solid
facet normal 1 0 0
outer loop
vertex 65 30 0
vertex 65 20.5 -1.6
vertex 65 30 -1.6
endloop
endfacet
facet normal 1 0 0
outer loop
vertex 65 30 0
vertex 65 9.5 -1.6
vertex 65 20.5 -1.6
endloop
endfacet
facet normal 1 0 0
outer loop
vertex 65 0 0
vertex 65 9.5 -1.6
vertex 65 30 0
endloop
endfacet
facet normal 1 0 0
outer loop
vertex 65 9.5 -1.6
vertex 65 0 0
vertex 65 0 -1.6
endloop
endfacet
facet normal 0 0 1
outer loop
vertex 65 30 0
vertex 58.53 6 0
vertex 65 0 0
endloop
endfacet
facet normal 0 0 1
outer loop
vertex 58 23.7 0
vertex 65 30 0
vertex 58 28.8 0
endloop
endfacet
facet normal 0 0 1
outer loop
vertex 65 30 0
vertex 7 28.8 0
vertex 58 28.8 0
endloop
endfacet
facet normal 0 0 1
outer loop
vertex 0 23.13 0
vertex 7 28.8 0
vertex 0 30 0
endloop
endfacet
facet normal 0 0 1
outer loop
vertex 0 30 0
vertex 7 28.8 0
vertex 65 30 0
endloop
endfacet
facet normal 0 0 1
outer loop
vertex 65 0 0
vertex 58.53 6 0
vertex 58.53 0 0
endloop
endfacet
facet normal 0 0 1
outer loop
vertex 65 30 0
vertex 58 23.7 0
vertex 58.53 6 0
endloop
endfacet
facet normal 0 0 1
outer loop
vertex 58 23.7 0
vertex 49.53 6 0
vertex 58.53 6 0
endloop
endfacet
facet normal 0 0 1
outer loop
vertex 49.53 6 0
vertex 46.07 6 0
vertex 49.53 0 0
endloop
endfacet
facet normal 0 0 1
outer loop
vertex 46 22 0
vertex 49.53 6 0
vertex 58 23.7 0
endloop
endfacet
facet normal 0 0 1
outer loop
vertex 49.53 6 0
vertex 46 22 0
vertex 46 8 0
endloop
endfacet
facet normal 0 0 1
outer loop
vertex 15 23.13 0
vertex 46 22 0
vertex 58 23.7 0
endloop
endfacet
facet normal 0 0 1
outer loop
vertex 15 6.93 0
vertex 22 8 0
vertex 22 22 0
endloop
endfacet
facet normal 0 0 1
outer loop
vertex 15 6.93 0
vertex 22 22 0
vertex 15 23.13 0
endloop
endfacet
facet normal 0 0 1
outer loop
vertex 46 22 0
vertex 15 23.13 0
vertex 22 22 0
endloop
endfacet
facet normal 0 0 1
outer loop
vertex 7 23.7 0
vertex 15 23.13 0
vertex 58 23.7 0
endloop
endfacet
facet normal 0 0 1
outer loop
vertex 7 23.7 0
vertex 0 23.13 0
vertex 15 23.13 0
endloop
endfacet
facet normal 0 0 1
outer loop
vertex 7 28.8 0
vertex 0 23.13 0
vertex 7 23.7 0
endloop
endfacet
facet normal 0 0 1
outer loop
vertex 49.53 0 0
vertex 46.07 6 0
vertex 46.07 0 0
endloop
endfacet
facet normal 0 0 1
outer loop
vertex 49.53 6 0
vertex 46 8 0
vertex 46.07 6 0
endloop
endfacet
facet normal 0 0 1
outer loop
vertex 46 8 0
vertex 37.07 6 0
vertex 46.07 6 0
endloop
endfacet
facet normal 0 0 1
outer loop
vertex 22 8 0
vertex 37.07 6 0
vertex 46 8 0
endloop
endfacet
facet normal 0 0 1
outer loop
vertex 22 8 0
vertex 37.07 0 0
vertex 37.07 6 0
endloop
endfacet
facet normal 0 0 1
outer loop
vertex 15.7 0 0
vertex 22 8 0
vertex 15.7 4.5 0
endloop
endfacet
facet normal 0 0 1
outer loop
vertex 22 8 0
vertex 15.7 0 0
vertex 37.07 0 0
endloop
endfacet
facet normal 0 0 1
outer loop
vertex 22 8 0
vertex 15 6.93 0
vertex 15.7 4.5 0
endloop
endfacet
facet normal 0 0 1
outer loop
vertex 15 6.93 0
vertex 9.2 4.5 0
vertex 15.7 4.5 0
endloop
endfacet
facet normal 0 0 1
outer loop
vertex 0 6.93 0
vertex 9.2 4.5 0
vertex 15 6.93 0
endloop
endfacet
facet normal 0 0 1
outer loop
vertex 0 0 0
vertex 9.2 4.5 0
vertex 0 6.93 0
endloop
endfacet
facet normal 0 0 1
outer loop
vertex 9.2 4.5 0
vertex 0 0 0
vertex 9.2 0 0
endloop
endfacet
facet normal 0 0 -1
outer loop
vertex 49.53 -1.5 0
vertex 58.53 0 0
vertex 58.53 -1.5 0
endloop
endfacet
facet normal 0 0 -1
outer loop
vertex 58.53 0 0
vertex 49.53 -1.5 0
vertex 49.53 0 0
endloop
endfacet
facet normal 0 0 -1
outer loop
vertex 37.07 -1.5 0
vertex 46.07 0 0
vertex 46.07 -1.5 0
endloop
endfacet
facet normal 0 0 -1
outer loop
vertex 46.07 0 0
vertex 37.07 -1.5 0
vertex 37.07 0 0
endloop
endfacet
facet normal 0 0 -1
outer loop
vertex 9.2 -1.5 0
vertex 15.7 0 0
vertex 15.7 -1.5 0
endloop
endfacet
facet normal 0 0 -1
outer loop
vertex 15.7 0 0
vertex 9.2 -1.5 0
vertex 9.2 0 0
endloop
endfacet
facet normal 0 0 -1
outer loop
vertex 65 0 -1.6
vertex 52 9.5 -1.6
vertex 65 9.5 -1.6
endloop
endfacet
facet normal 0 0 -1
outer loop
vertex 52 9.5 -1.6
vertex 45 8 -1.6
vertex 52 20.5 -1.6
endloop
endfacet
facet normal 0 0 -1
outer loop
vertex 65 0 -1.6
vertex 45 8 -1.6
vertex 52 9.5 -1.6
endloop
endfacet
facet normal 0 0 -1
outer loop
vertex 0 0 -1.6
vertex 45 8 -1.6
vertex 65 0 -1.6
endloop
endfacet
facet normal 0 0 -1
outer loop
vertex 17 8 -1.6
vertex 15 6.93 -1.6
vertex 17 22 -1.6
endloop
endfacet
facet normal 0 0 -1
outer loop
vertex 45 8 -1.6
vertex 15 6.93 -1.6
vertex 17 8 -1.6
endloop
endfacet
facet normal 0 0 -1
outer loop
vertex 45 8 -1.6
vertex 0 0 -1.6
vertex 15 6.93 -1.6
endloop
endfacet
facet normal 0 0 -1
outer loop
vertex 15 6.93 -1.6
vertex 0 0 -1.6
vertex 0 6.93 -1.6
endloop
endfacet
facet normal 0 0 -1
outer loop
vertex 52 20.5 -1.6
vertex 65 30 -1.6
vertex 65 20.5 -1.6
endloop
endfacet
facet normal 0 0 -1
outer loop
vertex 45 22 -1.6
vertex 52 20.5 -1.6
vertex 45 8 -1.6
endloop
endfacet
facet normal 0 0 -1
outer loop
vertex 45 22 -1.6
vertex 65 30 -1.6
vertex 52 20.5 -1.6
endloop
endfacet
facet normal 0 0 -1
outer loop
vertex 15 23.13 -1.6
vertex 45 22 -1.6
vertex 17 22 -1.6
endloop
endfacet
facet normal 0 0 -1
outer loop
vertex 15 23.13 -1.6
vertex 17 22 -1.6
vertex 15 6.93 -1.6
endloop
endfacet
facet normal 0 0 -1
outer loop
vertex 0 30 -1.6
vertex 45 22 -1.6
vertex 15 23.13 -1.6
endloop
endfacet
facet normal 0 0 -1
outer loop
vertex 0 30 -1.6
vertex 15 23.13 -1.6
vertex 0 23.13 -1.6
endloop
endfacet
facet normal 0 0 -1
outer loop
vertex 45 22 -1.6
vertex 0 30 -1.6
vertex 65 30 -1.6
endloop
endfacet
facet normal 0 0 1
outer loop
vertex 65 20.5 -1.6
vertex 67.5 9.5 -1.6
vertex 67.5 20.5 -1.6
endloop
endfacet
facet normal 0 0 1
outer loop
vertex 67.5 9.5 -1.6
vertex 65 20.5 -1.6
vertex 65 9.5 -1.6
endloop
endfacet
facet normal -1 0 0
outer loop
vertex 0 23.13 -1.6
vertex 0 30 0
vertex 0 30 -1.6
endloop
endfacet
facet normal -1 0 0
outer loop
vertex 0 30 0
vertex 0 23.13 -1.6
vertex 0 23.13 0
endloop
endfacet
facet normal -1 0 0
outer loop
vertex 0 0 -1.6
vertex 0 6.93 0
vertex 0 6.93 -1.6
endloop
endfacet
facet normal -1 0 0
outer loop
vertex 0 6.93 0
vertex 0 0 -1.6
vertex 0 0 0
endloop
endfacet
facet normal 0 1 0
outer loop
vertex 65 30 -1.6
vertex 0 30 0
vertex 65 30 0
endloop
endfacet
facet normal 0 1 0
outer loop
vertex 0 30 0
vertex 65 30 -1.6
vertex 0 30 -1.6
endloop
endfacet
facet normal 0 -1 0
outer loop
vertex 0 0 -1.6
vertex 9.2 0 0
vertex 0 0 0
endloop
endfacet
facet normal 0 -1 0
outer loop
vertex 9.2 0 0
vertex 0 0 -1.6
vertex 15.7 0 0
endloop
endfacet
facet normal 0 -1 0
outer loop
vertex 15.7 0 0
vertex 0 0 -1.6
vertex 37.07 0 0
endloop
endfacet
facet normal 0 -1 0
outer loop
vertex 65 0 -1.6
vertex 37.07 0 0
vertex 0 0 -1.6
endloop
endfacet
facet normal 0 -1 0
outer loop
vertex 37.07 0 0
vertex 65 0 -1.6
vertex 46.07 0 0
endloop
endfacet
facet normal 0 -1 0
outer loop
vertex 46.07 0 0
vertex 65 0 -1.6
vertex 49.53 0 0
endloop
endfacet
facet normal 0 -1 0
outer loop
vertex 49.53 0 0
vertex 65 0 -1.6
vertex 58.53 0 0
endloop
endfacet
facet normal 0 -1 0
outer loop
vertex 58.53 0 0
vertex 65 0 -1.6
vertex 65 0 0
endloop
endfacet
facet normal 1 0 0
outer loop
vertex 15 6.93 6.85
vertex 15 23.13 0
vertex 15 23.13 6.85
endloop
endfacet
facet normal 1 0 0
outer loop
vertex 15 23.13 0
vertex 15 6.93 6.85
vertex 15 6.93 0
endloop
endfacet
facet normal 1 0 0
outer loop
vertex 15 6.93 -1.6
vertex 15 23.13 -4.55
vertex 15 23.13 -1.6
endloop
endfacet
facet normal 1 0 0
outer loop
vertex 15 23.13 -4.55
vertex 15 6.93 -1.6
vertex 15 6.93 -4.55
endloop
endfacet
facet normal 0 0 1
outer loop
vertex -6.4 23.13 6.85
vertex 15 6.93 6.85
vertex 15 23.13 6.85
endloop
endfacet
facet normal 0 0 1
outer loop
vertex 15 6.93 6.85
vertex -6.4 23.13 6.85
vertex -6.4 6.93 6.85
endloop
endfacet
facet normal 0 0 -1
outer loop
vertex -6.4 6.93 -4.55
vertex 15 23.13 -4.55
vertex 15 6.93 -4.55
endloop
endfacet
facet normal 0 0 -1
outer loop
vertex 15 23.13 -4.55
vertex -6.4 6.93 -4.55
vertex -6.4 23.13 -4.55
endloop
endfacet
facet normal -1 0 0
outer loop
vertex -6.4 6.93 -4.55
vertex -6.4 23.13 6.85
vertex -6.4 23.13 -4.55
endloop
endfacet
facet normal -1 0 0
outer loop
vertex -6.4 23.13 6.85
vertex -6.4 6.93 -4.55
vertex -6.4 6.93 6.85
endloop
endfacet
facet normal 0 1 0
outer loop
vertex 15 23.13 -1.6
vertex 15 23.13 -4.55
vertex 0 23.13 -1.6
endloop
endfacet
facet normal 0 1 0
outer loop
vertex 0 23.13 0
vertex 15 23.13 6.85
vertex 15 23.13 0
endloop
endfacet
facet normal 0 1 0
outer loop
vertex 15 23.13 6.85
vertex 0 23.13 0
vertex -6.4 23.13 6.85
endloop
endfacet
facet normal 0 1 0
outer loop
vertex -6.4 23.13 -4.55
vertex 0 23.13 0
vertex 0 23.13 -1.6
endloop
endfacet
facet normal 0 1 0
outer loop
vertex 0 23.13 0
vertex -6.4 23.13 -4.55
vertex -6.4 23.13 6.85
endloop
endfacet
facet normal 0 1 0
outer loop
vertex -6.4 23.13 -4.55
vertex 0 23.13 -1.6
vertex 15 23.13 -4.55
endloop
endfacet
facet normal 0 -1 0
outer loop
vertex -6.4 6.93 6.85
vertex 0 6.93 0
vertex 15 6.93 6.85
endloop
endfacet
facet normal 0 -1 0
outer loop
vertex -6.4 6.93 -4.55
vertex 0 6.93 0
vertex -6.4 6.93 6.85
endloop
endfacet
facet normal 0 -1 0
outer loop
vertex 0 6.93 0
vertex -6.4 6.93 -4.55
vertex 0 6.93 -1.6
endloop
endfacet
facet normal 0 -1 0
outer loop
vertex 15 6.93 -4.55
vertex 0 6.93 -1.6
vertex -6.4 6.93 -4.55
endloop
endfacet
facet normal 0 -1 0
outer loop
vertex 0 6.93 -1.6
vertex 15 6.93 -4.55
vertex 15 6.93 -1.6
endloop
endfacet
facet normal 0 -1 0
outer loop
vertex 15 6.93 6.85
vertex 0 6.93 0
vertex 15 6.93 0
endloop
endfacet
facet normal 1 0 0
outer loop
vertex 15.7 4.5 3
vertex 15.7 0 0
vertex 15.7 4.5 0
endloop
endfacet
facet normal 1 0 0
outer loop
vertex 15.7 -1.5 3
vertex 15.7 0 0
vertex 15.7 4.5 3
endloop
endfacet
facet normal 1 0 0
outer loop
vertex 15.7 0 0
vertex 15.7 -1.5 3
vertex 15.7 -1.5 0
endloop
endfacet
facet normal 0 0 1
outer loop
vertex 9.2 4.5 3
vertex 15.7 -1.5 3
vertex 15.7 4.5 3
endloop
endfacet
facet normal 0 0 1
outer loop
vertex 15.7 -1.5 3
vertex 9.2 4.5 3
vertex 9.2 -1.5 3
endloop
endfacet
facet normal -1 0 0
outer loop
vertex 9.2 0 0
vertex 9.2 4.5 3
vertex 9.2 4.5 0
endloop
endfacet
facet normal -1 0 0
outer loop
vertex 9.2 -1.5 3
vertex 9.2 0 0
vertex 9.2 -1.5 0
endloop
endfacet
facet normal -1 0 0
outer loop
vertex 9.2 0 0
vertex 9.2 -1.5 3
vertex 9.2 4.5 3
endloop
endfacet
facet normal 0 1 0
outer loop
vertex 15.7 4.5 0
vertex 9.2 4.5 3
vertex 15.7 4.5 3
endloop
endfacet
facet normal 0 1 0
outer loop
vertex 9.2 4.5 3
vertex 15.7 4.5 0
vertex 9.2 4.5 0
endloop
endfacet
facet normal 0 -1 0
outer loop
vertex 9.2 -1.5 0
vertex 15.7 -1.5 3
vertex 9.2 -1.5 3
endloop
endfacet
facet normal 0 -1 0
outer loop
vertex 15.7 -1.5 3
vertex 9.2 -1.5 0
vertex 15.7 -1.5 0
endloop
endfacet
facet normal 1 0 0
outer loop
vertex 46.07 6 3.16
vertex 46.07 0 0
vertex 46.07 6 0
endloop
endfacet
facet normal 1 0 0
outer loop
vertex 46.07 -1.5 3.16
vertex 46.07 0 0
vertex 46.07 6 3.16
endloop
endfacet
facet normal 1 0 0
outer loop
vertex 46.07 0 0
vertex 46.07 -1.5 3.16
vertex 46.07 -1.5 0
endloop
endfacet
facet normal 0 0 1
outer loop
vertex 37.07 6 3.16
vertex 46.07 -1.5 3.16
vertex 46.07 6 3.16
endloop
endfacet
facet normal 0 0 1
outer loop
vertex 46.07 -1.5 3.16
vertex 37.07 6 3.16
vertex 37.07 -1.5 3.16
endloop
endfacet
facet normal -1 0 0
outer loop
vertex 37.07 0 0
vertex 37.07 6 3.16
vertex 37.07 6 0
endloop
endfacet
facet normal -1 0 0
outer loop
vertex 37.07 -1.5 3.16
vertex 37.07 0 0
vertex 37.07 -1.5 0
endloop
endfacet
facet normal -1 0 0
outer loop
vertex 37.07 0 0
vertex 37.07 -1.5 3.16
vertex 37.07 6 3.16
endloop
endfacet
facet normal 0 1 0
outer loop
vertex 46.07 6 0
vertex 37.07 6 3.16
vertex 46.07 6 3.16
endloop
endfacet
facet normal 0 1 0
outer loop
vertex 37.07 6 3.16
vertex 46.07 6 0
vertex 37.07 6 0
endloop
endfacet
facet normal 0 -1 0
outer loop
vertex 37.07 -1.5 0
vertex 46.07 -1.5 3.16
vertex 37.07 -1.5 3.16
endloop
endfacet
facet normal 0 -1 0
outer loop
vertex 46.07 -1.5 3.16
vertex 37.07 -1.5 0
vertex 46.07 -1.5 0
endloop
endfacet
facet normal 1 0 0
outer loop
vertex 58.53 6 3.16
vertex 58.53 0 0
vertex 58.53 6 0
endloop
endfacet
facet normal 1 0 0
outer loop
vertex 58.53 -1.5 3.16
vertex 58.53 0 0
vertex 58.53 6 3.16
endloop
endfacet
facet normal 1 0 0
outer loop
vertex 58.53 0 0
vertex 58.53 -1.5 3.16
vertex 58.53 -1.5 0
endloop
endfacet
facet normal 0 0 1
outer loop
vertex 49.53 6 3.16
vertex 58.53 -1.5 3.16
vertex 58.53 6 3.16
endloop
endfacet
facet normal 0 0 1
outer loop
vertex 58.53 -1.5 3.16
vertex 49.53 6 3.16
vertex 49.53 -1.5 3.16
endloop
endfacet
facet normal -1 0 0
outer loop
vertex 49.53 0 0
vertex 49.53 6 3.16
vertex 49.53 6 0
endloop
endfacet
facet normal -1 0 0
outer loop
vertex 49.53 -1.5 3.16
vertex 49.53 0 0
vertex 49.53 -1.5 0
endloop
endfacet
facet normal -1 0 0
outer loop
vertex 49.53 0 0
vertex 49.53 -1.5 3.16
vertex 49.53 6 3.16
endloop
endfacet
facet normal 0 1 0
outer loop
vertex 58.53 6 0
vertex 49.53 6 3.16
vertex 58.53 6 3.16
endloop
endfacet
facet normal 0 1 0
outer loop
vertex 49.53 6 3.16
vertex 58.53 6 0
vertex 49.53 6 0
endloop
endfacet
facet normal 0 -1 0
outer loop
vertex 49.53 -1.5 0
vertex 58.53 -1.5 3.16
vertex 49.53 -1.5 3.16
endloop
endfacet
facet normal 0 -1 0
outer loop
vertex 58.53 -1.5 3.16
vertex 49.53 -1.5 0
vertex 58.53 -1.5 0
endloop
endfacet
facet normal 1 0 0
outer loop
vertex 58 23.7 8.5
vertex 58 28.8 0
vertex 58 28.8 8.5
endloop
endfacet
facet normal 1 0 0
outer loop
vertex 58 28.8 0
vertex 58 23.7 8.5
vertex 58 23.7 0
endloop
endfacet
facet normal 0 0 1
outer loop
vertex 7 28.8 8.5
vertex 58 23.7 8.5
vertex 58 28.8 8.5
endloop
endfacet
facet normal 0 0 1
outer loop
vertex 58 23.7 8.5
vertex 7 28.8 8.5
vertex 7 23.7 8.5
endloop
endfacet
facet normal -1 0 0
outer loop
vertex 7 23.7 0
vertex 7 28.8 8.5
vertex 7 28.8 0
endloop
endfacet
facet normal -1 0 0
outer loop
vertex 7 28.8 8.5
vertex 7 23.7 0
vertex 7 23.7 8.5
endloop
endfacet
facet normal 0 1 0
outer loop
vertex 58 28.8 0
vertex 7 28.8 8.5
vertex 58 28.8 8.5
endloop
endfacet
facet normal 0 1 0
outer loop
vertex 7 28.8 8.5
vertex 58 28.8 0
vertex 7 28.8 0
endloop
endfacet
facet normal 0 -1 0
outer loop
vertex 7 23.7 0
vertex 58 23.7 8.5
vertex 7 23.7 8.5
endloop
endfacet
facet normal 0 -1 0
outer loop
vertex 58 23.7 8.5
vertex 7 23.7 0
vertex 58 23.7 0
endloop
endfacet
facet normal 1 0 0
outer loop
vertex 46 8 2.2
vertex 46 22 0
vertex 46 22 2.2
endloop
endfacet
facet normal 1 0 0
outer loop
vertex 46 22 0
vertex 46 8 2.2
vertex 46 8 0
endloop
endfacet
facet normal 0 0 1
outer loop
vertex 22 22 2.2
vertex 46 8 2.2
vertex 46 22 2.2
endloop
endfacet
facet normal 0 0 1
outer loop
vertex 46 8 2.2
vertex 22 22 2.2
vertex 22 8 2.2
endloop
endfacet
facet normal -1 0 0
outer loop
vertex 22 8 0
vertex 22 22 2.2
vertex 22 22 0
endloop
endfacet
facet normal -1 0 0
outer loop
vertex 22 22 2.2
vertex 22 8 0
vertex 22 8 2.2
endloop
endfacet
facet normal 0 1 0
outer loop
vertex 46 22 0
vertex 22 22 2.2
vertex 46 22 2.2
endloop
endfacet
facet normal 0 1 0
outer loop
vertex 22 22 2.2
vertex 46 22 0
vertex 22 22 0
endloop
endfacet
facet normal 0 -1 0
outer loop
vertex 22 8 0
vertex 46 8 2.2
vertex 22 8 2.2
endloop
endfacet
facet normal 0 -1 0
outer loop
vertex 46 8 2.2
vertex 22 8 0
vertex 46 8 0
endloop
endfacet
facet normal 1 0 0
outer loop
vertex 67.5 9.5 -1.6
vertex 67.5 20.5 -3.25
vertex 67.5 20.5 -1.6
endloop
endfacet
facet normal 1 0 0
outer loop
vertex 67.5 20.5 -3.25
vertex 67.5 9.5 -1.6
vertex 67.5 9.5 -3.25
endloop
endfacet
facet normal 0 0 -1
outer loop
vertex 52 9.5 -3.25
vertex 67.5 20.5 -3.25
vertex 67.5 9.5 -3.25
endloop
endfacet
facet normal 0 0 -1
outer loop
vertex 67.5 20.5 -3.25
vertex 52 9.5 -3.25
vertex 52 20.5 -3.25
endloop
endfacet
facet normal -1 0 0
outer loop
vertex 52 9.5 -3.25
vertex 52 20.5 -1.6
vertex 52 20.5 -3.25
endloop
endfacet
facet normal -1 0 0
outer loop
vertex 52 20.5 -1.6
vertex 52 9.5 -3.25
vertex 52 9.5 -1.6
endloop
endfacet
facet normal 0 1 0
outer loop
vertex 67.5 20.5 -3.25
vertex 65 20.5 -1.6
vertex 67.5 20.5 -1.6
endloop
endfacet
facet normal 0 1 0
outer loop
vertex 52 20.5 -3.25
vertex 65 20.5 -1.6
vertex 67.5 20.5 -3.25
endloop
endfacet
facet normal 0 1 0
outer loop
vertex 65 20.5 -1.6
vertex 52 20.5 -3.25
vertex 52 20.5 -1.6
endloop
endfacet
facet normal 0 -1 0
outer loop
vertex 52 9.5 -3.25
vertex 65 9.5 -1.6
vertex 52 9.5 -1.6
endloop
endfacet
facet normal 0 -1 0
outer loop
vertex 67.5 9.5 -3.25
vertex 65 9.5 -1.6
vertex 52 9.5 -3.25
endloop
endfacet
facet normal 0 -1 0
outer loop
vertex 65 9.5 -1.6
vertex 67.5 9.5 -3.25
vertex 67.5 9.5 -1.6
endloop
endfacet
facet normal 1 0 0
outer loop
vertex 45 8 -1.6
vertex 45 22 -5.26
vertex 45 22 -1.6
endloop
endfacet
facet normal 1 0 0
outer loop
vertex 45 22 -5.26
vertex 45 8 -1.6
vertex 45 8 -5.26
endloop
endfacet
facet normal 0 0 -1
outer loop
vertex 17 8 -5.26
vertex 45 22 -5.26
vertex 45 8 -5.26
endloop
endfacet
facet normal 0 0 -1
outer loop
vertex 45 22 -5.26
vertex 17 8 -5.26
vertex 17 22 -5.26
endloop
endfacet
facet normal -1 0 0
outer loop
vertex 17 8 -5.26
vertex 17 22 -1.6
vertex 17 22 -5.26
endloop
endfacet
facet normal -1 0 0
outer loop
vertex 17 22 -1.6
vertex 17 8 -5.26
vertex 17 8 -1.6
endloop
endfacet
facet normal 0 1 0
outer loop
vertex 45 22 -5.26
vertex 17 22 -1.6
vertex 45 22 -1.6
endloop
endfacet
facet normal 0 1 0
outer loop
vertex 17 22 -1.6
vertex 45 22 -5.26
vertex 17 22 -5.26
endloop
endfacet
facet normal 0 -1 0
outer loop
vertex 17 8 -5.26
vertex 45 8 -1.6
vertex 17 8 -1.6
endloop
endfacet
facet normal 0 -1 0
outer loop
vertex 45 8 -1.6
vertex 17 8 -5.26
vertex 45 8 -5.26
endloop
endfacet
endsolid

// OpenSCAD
// Nominal manifold reference envelopes for Radxa ZERO 3E + RA023 PoE HAT (14.5 mm pillars).
// Derived from hardware/usb-housing/poe-reference.json (official RS109_RA023 STEP bounds)
// and Radxa's RA023 BOM (4 x M2.5 x 14.5 mm insulated copper pillars + 8 x CM2.5 x 4 screws).
// Board-local frame: SBC PCB x=[0,65], y=[0,30], z=[-1.6,0]. Placed in housing by Z + 7.4 mm.
// Nominal design reference only — NOT measured owner hardware.
part = "sbc-ref";
hat_gap = 14.5;
$fn = 36;
mounts = [[3.549904,3.599942],[61.399928,3.599942],[3.599942,26.450036],[61.399928,26.500074]];

module sbc_ref() {
  union() {
    // 65 x 30 x 1.6 mm ZERO 3E PCB
    translate([0, 0, -1.6]) cube([65, 30, 1.6]);
    // Gigabit Ethernet RJ45 jack (official face outline y=6.93..23.13, z=-4.55..6.85)
    translate([-6.4, 6.93, -4.55]) cube([21.4, 16.20, 11.40]);
    // micro-HDMI receptacle (covered by front wall, y=-1.5..4.5)
    translate([9.2, -1.5, 0]) cube([6.5, 6.0, 3.0]);
    // USB 3.0 Host Type-C receptacle (inner, center x=41.57)
    translate([41.57 - 4.5, -1.5, 0]) cube([9.0, 7.5, 3.16]);
    // USB 2.0 OTG / 5V Power Type-C receptacle (outer, center x=54.03)
    translate([54.03 - 4.5, -1.5, 0]) cube([9.0, 7.5, 3.16]);
    // 40-pin GPIO male header (top of SBC, z=0..8.5)
    translate([7.0, 23.7, 0]) cube([51.0, 5.1, 8.5]);
    // Main RK3566 SoC / PMIC / DRAM nominal envelope on top face
    translate([22.0, 8.0, 0]) cube([24.0, 14.0, 2.2]);
    // Underside microSD cage + seated card (2.5 mm projection past x=65)
    translate([52.0, 9.5, -3.25]) cube([15.5, 11.0, 1.65]);
    // Lowest underside through-hole / SMD nominal keepout (z_min = -5.26 from official STEP)
    translate([17.0, 8.0, -5.26]) cube([28.0, 14.0, 3.66]);
  }
}

module hat_ref() {
  union() {
    // 65 x 30 x 1.6 mm RA023 PoE HAT PCB at official 14.5 mm pillar spacing
    translate([0, 0, hat_gap]) cube([65, 30, 1.6]);
    // Female GPIO stack header between SBC and HAT (kept inside y=23.7..28.8)
    translate([7.0, 23.7, 8.55]) cube([51.0, 5.1, hat_gap - 8.55]);
    // Optional 20 x 20 x 6.5 mm underside cooling fan envelope between boards
    // (shifted 0.5 mm clear of 40-pin GPIO header y=23.7..28.8).
    translate([22.0, 3.5, hat_gap - 6.5]) cube([20.0, 20.0, 6.5]);
    // PoE transformer / inductor / rectifier tallest top-side envelope (to z_rel = hat_gap + 13.7)
    translate([16.5, 3.0, hat_gap + 1.6]) cube([29.0, 22.0, 12.1]);
    // Four M2.5 x 14.5 mm insulated copper pillars + upper CM2.5x4 screw head envelopes
    // (lower CM2.5x4 screw heads sit below SBC PCB at z=-3.4..-1.6, kept inside dia-8 reserve)
    for (m = mounts) {
      translate([m[0], m[1], 0.05]) cylinder(d=5.2, h=hat_gap - 0.05);
      translate([m[0], m[1], hat_gap + 1.6]) cylinder(d=5.2, h=1.8);
    }
  }
}

if (part == "sbc-ref") sbc_ref();
else if (part == "hat-ref") hat_ref();
else assert(false, "Unknown reference part");
